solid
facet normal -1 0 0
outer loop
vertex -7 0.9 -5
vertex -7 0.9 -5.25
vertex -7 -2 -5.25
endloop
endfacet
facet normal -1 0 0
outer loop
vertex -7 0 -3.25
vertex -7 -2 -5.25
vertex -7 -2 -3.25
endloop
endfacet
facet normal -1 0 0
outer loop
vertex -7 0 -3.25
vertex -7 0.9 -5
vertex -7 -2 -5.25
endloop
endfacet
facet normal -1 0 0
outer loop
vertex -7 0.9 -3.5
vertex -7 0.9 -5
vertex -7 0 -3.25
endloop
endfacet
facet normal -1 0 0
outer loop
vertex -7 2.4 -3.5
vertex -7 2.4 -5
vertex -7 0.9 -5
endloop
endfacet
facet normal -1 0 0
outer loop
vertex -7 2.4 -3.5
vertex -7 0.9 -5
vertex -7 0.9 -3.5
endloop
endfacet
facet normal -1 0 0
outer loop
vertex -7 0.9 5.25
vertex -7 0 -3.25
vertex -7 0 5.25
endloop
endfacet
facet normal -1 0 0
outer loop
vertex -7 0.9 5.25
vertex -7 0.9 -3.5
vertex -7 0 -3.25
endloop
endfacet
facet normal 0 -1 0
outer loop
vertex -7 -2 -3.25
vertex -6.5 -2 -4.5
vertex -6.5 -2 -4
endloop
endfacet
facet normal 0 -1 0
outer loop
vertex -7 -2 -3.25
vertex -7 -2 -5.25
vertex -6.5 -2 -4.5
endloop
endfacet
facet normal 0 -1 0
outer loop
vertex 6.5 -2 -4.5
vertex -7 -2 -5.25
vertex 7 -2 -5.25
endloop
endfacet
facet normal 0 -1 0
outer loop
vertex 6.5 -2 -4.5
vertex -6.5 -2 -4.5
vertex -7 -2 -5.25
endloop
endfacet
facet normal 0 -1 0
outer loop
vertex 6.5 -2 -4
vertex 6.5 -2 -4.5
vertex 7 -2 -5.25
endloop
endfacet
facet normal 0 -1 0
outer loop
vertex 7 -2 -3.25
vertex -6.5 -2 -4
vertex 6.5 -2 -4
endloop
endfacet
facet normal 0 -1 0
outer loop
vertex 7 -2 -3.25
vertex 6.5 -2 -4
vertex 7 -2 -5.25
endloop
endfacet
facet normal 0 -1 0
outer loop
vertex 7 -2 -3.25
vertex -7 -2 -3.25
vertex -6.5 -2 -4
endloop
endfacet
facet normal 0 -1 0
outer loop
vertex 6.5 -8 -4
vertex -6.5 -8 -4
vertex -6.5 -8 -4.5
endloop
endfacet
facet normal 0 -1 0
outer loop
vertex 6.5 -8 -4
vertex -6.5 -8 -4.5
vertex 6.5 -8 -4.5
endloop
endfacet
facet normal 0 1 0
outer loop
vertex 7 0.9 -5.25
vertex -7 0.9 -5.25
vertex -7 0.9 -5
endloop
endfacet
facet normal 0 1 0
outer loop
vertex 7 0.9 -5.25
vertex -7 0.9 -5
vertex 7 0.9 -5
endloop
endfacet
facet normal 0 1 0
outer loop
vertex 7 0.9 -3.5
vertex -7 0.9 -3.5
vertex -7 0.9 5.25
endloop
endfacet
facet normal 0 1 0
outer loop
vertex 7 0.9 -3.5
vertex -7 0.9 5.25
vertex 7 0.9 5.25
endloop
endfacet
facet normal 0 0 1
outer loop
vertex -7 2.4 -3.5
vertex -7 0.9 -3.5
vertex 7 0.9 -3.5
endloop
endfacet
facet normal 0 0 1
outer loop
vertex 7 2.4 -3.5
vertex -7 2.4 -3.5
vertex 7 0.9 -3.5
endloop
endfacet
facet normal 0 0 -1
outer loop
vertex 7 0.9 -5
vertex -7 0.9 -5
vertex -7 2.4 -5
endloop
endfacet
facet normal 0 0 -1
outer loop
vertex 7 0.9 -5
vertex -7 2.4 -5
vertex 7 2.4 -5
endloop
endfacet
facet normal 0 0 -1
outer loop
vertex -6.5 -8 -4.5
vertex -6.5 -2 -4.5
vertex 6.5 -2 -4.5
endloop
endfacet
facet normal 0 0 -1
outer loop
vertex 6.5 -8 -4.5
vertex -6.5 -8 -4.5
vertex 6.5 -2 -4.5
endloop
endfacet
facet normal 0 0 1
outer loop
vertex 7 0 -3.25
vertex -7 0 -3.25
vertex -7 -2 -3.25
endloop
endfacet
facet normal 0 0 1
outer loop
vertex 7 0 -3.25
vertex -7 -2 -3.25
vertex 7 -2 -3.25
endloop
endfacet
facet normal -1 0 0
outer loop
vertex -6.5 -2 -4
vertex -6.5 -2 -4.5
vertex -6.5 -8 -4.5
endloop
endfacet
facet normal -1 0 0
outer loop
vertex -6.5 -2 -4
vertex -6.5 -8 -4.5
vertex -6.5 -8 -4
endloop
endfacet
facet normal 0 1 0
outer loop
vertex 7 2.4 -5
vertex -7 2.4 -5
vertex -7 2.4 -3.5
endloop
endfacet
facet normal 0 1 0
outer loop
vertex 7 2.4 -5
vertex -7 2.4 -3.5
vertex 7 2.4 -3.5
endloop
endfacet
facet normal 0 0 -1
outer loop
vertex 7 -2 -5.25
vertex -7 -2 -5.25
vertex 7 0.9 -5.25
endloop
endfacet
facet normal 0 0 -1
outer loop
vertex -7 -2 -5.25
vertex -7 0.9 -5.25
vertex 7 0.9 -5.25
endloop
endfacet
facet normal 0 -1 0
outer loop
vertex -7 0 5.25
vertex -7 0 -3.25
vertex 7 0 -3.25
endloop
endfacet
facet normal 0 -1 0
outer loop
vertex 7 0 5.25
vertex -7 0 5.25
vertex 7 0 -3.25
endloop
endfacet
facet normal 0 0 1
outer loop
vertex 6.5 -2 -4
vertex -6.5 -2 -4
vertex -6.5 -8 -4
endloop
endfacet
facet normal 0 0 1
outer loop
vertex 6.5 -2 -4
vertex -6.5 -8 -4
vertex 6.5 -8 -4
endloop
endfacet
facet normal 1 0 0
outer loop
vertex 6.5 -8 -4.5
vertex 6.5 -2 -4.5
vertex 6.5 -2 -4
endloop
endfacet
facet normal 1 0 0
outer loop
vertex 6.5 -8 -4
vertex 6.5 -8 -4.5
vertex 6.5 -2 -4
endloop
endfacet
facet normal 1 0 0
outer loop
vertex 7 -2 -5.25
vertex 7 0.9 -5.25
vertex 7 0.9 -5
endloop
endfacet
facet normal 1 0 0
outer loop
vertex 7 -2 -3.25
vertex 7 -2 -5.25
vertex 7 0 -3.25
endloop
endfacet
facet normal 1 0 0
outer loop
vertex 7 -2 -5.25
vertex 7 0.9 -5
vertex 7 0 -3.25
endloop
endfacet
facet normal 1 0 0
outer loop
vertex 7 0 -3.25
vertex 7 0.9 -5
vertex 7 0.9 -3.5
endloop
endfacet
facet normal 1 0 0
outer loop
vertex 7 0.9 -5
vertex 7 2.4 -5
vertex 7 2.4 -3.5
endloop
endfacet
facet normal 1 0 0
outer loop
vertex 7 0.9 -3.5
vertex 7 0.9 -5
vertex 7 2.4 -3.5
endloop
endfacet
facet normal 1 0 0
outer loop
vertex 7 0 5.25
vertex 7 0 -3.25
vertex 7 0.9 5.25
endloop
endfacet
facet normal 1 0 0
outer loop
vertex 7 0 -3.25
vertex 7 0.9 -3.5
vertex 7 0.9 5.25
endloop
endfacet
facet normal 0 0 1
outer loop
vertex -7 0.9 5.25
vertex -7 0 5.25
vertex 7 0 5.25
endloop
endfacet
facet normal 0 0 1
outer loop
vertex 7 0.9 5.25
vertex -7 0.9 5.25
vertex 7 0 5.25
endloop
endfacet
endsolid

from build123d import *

# Parameters (mm, degrees)
SKETCH_1_W      = 14
SKETCH_1_H      = 10.5
EXTRUDE_1_DEPTH = 0.9
SKETCH_3_W      = 14
SKETCH_3_H      = 2
EXTRUDE_2_DEPTH = 2
SKETCH_4_W      = 13
SKETCH_4_H      = 0.5
EXTRUDE_3_DEPTH = 6
SKETCH_8_W      = 14
SKETCH_8_H      = 1.5
EXTRUDE_4_DEPTH = 1.5


with BuildPart() as part:
    # Эскиз1 → Бобышка-Вытянуть1 (new body)
    with BuildSketch(Plane(origin=(0, 0, 0), x_dir=(1, 0, 0), z_dir=(0, 1, 0))):
        Rectangle(SKETCH_1_W, SKETCH_1_H)
    extrude(amount=EXTRUDE_1_DEPTH)

    # Эскиз3 → Бобышка-Вытянуть2 (add)
    with BuildSketch(Plane.XZ):
        with Locations((0, -4.25)):
            Rectangle(SKETCH_3_W, SKETCH_3_H)
    extrude(amount=EXTRUDE_2_DEPTH)

    # Эскиз4 → Бобышка-Вытянуть3 (add)
    with BuildSketch(Plane.XZ.offset(2)):
        with Locations((0, -4.25)):
            Rectangle(SKETCH_4_W, SKETCH_4_H)
    extrude(amount=EXTRUDE_3_DEPTH)

    # Эскиз8 → Бобышка-Вытянуть4 (add)
    with BuildSketch(Plane(origin=(0, 0.9, 0), x_dir=(1, 0, 0), z_dir=(0, 1, 0))):
        with Locations((0, 4.25)):
            Rectangle(SKETCH_8_W, SKETCH_8_H)
    extrude(amount=EXTRUDE_4_DEPTH)


solid = part.part
